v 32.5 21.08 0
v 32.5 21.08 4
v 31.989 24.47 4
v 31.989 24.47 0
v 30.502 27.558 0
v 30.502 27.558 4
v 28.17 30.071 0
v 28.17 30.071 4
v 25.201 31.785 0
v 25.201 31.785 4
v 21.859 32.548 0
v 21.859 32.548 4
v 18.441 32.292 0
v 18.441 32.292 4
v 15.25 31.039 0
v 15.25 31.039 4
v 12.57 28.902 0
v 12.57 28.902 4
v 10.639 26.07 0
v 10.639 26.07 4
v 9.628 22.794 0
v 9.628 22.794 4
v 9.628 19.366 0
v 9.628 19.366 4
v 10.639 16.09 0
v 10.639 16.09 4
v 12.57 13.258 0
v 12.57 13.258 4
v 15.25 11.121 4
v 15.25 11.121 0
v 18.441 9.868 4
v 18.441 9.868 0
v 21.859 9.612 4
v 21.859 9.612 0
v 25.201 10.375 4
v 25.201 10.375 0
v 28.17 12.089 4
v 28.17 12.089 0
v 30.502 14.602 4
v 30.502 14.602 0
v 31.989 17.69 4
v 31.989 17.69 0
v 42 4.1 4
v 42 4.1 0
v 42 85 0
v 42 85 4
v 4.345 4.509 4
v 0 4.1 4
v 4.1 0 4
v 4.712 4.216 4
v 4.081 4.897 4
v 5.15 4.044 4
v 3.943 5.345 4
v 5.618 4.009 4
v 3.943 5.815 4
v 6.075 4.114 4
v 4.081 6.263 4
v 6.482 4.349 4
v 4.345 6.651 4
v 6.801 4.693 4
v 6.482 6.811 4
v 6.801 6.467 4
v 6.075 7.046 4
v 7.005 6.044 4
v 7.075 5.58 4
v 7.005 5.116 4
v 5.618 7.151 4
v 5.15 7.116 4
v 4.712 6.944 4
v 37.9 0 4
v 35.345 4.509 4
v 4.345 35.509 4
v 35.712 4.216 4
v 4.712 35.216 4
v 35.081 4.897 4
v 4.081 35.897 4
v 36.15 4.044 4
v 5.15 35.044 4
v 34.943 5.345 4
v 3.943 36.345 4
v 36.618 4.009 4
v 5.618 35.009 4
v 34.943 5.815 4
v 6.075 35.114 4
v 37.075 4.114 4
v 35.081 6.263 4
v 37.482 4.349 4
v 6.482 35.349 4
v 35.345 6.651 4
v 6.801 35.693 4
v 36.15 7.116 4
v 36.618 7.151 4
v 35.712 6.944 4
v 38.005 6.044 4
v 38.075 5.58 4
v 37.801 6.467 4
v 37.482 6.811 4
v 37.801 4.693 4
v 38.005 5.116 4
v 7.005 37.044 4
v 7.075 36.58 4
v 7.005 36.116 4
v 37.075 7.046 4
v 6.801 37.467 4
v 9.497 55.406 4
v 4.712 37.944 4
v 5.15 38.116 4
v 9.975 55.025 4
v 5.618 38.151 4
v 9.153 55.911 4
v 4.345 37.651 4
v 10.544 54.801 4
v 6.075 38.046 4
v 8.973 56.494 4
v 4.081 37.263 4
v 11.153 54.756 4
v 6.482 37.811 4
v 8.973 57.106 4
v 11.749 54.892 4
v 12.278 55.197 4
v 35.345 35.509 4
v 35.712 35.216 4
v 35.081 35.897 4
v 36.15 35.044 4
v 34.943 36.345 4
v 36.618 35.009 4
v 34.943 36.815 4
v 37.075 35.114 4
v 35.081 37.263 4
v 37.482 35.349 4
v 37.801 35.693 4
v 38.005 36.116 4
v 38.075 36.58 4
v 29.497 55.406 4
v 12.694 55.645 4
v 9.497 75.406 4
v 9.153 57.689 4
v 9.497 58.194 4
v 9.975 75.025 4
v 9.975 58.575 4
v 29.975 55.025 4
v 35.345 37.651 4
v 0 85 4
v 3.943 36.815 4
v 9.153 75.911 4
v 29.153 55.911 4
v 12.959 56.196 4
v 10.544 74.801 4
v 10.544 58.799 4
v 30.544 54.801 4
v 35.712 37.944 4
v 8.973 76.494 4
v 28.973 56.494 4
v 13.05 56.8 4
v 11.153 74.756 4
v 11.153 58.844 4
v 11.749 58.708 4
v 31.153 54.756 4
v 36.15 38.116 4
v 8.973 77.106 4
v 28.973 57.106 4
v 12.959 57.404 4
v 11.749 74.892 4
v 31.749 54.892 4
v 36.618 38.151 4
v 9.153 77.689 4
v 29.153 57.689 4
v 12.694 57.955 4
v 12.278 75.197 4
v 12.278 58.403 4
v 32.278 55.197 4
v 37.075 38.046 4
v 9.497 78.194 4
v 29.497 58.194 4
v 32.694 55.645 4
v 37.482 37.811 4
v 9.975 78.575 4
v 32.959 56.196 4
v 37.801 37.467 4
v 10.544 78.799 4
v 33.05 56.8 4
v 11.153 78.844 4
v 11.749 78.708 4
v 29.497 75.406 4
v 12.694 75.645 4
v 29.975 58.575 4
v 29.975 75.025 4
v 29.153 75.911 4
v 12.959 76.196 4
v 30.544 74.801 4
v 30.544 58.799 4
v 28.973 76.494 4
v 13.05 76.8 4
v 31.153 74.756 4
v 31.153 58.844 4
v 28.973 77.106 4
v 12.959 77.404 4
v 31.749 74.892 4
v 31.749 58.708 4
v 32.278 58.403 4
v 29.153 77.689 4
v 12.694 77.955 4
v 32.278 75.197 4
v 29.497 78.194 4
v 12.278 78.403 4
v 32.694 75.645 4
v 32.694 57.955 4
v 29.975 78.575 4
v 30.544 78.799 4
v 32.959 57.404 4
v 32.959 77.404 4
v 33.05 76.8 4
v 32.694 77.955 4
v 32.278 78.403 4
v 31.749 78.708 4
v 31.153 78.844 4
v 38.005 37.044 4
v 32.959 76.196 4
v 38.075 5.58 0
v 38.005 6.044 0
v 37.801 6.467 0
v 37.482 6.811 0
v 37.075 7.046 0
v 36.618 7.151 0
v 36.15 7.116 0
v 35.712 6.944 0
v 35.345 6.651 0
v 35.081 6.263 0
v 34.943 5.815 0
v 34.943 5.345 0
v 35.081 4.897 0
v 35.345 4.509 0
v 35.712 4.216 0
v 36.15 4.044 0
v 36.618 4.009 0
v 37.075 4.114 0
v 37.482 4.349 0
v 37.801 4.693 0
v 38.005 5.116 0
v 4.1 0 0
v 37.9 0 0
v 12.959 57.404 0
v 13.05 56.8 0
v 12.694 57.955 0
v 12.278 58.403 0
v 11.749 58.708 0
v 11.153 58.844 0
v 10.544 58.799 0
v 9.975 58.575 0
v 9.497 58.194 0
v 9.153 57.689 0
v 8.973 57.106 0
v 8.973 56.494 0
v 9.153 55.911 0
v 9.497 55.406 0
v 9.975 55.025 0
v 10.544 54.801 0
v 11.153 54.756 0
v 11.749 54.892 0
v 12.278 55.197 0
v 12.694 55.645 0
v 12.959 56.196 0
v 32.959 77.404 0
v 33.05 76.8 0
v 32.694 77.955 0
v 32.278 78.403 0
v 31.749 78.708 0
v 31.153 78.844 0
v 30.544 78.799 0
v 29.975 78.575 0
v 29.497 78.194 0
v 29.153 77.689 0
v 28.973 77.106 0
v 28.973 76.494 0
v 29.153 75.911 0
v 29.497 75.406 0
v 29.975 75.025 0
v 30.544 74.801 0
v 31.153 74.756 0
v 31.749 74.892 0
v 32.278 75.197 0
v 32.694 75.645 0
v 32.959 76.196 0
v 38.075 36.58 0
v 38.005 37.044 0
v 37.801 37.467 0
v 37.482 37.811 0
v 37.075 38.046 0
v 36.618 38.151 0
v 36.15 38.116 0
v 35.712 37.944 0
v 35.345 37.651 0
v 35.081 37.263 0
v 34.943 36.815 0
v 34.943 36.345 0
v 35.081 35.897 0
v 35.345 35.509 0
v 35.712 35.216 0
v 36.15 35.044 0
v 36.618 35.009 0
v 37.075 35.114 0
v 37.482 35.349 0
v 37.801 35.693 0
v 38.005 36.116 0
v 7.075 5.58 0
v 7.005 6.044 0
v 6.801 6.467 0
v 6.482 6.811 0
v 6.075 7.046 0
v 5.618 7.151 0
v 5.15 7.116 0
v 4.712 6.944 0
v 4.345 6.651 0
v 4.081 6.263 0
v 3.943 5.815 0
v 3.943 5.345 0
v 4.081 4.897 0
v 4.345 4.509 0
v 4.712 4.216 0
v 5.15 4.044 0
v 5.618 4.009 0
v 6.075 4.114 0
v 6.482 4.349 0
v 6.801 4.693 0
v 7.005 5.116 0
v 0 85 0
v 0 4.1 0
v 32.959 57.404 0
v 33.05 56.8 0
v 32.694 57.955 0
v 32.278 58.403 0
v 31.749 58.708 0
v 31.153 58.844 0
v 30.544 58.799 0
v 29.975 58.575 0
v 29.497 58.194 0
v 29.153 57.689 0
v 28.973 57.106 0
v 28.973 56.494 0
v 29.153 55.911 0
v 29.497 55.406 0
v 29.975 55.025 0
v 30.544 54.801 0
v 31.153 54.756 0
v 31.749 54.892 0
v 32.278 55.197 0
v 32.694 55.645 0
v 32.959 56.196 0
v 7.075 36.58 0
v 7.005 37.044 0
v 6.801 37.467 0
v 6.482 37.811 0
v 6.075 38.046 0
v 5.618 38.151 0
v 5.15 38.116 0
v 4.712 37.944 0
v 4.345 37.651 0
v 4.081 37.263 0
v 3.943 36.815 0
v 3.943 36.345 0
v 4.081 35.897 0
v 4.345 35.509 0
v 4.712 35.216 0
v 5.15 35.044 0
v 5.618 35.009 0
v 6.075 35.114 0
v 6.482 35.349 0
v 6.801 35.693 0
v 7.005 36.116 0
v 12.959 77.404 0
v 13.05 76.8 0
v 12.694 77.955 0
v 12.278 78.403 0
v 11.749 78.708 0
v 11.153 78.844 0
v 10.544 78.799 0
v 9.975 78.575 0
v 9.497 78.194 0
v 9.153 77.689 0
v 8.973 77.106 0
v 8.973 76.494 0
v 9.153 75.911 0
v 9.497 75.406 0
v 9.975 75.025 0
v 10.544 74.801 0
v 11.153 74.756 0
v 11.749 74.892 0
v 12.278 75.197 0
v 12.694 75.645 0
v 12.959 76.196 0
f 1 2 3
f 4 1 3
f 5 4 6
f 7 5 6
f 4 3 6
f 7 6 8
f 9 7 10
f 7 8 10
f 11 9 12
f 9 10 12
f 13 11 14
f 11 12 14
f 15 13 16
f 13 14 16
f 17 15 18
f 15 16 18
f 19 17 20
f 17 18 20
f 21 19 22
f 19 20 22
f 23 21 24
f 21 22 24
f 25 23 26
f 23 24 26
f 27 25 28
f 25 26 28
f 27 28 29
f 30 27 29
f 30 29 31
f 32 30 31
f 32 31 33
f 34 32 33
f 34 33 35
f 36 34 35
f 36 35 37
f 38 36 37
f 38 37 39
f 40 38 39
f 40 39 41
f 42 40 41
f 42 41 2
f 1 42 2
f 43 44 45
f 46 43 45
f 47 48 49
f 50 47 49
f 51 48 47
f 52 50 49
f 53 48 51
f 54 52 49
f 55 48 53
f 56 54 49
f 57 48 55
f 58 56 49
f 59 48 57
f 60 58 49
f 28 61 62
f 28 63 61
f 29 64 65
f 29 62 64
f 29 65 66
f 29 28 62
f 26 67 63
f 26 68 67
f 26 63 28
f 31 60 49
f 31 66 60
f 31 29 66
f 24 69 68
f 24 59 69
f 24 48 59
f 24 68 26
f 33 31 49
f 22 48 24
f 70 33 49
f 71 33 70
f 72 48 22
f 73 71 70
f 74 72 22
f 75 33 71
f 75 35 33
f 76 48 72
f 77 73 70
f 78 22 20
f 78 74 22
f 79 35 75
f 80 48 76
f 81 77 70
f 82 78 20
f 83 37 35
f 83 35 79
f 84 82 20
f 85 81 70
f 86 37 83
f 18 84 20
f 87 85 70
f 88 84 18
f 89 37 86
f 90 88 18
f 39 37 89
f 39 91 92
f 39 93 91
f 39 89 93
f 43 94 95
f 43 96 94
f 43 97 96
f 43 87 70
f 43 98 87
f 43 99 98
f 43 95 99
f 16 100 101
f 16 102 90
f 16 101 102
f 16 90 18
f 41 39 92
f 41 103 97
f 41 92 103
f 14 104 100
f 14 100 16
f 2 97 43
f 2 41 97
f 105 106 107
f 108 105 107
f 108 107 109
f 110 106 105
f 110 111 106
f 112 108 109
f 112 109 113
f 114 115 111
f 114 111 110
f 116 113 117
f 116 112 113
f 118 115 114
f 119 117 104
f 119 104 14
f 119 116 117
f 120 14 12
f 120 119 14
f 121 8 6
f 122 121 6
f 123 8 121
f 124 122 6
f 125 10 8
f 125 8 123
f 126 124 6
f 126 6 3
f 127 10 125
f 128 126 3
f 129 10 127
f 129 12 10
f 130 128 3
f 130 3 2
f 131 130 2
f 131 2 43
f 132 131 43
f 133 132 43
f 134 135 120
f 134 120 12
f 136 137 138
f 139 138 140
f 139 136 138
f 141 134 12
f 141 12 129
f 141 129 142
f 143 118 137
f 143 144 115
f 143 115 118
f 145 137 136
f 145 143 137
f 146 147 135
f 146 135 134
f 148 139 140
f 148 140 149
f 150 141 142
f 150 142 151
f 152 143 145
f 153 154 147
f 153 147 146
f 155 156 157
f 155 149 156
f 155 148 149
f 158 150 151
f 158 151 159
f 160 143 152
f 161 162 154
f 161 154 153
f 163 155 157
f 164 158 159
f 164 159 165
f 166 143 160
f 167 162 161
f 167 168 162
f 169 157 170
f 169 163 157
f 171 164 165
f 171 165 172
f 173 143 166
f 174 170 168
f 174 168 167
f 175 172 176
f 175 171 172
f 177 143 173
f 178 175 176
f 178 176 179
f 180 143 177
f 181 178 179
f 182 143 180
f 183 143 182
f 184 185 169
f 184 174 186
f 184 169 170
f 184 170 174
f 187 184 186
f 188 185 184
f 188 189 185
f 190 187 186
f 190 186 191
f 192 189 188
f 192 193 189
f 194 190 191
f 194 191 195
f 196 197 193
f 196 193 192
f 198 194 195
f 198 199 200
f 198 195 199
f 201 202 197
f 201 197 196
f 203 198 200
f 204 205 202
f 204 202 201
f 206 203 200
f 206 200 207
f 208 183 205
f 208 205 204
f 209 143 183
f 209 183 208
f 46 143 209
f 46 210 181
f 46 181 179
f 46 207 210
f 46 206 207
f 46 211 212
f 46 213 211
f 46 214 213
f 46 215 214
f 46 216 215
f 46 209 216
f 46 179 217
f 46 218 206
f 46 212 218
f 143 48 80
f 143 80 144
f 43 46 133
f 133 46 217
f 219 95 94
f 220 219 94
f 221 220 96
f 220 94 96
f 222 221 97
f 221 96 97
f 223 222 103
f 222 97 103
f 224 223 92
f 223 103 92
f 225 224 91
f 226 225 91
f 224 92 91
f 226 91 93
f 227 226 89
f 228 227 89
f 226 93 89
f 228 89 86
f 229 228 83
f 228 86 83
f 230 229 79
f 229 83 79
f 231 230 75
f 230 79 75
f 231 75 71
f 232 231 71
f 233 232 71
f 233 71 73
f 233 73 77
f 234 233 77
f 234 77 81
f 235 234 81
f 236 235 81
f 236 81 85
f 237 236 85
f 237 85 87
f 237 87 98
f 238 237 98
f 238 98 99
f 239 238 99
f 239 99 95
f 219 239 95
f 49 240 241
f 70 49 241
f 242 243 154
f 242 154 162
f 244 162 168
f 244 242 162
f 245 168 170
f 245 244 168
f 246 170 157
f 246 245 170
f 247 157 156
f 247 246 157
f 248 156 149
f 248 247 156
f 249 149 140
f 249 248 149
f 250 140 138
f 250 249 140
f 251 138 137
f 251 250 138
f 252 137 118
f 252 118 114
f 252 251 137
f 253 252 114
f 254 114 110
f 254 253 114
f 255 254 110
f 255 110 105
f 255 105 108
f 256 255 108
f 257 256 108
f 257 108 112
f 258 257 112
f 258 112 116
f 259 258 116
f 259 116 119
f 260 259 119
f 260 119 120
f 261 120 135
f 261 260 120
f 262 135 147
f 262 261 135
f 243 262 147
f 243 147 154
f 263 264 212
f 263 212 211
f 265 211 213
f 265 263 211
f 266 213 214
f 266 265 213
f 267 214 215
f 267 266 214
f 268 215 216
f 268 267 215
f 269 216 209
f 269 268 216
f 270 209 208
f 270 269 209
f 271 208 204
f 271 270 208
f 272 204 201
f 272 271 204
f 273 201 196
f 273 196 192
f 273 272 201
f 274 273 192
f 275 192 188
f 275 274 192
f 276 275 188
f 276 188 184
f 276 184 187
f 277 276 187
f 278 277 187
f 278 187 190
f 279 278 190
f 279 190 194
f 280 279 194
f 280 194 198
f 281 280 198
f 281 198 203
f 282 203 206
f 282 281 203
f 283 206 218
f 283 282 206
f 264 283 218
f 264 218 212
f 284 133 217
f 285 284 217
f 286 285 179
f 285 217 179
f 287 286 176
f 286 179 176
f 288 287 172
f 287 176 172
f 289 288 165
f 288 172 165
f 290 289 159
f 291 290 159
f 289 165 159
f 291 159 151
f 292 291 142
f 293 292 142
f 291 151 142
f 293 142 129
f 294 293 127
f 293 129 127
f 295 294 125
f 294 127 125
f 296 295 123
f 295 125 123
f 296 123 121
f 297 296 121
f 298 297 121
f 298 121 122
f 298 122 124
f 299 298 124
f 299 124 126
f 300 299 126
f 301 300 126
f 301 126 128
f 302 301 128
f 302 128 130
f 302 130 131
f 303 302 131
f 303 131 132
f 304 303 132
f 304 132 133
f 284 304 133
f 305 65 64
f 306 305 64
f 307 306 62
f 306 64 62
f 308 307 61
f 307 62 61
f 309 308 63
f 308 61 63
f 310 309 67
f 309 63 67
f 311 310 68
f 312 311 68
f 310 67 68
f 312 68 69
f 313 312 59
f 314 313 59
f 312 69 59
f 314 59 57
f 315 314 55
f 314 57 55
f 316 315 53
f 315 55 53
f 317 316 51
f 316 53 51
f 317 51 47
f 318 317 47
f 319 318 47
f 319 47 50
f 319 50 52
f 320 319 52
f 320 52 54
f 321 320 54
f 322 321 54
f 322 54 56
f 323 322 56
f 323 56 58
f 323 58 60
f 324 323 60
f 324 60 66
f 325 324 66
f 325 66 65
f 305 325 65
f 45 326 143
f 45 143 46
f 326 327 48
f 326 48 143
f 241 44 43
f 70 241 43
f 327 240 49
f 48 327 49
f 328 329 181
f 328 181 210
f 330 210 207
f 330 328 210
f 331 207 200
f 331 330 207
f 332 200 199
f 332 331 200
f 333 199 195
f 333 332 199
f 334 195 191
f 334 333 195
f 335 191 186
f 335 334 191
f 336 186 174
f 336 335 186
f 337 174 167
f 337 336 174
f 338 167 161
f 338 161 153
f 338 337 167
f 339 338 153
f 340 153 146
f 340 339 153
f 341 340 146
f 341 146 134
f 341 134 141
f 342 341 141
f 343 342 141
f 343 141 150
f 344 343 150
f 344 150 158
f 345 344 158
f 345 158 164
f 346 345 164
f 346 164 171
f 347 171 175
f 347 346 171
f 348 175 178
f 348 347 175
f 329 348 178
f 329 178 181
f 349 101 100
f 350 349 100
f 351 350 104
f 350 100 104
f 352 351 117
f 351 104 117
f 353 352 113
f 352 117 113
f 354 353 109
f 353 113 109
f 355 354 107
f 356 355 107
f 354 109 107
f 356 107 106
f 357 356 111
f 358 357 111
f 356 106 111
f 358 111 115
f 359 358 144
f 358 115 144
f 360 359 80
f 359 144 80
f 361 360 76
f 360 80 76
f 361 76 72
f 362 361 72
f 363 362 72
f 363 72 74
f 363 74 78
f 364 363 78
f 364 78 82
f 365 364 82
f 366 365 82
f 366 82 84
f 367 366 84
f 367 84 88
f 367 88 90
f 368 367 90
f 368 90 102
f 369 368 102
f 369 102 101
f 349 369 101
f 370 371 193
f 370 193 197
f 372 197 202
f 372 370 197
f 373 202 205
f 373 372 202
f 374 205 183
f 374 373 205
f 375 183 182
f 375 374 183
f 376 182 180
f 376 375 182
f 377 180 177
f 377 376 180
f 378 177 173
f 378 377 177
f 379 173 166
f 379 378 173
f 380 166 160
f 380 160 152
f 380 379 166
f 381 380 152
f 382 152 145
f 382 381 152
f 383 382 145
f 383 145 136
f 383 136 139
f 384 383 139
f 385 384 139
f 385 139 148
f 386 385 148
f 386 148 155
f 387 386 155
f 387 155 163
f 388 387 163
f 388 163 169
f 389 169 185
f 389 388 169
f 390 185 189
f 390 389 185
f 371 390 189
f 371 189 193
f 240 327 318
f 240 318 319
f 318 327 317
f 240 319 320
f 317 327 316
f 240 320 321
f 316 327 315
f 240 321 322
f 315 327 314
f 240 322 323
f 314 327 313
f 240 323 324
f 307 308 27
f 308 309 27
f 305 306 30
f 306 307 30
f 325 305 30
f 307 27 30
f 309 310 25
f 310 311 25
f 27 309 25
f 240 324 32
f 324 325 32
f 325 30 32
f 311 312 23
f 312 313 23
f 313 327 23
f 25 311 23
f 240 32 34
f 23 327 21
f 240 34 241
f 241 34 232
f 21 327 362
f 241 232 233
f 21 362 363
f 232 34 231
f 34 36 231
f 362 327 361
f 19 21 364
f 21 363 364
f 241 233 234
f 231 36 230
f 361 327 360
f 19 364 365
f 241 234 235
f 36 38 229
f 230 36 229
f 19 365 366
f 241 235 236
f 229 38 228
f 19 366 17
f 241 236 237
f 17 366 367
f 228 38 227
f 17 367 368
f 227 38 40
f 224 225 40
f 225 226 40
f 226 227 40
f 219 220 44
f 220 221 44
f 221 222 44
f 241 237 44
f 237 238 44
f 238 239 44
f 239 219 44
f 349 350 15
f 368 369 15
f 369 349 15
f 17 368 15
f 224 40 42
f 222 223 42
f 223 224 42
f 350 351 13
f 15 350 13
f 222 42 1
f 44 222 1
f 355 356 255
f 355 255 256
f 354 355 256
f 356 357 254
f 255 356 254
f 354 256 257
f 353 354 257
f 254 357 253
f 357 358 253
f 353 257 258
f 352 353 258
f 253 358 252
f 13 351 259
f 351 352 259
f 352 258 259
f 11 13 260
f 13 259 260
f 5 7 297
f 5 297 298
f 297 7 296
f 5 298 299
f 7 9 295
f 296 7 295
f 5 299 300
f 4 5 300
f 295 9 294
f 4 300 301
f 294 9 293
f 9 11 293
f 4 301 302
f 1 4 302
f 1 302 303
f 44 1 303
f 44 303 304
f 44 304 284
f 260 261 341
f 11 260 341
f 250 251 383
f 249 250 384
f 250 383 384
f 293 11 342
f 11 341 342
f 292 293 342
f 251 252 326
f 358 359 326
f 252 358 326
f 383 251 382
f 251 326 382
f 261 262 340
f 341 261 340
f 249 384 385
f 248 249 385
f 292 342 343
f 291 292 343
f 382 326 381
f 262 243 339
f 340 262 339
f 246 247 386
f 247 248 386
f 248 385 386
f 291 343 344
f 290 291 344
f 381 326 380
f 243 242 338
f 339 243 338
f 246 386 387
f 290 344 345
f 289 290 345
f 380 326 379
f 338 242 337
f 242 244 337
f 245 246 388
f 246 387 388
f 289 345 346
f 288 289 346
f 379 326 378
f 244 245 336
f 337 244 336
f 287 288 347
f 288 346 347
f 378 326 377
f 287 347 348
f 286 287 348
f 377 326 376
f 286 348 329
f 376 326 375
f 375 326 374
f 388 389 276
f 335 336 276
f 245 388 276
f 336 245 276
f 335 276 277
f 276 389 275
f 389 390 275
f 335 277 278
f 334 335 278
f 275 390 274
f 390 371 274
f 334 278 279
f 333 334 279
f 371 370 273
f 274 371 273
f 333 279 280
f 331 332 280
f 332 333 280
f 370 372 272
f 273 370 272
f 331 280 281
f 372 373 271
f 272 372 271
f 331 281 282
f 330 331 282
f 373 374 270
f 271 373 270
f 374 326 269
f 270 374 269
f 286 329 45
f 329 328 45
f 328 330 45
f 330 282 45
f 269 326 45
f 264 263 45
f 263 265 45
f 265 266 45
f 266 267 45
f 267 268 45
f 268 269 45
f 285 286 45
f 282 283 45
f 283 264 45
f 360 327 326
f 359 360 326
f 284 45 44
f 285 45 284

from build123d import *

# Parameters (mm, degrees)
CROQUIS1_W              = 42
CROQUIS1_H              = 85
CROQUIS1_R              = 2.05
CROQUIS1_R_2            = 2.55
SALIENTE_EXTRUIR1_DEPTH = 4
CROQUIS5_R              = 11.5
CROQUIS5_R_2            = 1.575
CORTAR_EXTRUIR2_DEPTH   = 5
CHAFL_N1_SIZE           = 4.1


with BuildPart() as part:
    # Croquis1 → Saliente-Extruir1 (new body)
    with BuildSketch(Plane.XY):
        with Locations((21, 42.5)):
            Rectangle(CROQUIS1_W, CROQUIS1_H)
        with Locations((11, 76.8)):
            Circle(CROQUIS1_R, mode=Mode.SUBTRACT)
        with Locations((31, 76.8)):
            Circle(CROQUIS1_R, mode=Mode.SUBTRACT)
        with Locations((31, 56.8)):
            Circle(CROQUIS1_R, mode=Mode.SUBTRACT)
        with Locations((11, 56.8)):
            Circle(CROQUIS1_R, mode=Mode.SUBTRACT)
        with Locations((21, 21.08)):
            Circle(CROQUIS1_R_2, mode=Mode.SUBTRACT)
    extrude(amount=SALIENTE_EXTRUIR1_DEPTH)

    # Croquis5 → Cortar-Extruir2 (cut, through all)
    with BuildSketch(Plane.XY.offset(4)):
        with Locations((21, 21.08)):
            Circle(CROQUIS5_R)
        with Locations((5.5, 36.58)):
            Circle(CROQUIS5_R_2)
        with Locations((36.5, 36.58)):
            Circle(CROQUIS5_R_2)
        with Locations((36.5, 5.58)):
            Circle(CROQUIS5_R_2)
        with Locations((5.5, 5.58)):
            Circle(CROQUIS5_R_2)
    extrude(amount=-CORTAR_EXTRUIR2_DEPTH, mode=Mode.SUBTRACT)

    # Chaflán1
    chafl_n1_edges = [part.edges().sort_by_distance(p)[0] for p in [
        (42, 0, 2),
        (0, 0, 2),
    ]]
    chamfer(chafl_n1_edges, length=CHAFL_N1_SIZE)


solid = part.part
